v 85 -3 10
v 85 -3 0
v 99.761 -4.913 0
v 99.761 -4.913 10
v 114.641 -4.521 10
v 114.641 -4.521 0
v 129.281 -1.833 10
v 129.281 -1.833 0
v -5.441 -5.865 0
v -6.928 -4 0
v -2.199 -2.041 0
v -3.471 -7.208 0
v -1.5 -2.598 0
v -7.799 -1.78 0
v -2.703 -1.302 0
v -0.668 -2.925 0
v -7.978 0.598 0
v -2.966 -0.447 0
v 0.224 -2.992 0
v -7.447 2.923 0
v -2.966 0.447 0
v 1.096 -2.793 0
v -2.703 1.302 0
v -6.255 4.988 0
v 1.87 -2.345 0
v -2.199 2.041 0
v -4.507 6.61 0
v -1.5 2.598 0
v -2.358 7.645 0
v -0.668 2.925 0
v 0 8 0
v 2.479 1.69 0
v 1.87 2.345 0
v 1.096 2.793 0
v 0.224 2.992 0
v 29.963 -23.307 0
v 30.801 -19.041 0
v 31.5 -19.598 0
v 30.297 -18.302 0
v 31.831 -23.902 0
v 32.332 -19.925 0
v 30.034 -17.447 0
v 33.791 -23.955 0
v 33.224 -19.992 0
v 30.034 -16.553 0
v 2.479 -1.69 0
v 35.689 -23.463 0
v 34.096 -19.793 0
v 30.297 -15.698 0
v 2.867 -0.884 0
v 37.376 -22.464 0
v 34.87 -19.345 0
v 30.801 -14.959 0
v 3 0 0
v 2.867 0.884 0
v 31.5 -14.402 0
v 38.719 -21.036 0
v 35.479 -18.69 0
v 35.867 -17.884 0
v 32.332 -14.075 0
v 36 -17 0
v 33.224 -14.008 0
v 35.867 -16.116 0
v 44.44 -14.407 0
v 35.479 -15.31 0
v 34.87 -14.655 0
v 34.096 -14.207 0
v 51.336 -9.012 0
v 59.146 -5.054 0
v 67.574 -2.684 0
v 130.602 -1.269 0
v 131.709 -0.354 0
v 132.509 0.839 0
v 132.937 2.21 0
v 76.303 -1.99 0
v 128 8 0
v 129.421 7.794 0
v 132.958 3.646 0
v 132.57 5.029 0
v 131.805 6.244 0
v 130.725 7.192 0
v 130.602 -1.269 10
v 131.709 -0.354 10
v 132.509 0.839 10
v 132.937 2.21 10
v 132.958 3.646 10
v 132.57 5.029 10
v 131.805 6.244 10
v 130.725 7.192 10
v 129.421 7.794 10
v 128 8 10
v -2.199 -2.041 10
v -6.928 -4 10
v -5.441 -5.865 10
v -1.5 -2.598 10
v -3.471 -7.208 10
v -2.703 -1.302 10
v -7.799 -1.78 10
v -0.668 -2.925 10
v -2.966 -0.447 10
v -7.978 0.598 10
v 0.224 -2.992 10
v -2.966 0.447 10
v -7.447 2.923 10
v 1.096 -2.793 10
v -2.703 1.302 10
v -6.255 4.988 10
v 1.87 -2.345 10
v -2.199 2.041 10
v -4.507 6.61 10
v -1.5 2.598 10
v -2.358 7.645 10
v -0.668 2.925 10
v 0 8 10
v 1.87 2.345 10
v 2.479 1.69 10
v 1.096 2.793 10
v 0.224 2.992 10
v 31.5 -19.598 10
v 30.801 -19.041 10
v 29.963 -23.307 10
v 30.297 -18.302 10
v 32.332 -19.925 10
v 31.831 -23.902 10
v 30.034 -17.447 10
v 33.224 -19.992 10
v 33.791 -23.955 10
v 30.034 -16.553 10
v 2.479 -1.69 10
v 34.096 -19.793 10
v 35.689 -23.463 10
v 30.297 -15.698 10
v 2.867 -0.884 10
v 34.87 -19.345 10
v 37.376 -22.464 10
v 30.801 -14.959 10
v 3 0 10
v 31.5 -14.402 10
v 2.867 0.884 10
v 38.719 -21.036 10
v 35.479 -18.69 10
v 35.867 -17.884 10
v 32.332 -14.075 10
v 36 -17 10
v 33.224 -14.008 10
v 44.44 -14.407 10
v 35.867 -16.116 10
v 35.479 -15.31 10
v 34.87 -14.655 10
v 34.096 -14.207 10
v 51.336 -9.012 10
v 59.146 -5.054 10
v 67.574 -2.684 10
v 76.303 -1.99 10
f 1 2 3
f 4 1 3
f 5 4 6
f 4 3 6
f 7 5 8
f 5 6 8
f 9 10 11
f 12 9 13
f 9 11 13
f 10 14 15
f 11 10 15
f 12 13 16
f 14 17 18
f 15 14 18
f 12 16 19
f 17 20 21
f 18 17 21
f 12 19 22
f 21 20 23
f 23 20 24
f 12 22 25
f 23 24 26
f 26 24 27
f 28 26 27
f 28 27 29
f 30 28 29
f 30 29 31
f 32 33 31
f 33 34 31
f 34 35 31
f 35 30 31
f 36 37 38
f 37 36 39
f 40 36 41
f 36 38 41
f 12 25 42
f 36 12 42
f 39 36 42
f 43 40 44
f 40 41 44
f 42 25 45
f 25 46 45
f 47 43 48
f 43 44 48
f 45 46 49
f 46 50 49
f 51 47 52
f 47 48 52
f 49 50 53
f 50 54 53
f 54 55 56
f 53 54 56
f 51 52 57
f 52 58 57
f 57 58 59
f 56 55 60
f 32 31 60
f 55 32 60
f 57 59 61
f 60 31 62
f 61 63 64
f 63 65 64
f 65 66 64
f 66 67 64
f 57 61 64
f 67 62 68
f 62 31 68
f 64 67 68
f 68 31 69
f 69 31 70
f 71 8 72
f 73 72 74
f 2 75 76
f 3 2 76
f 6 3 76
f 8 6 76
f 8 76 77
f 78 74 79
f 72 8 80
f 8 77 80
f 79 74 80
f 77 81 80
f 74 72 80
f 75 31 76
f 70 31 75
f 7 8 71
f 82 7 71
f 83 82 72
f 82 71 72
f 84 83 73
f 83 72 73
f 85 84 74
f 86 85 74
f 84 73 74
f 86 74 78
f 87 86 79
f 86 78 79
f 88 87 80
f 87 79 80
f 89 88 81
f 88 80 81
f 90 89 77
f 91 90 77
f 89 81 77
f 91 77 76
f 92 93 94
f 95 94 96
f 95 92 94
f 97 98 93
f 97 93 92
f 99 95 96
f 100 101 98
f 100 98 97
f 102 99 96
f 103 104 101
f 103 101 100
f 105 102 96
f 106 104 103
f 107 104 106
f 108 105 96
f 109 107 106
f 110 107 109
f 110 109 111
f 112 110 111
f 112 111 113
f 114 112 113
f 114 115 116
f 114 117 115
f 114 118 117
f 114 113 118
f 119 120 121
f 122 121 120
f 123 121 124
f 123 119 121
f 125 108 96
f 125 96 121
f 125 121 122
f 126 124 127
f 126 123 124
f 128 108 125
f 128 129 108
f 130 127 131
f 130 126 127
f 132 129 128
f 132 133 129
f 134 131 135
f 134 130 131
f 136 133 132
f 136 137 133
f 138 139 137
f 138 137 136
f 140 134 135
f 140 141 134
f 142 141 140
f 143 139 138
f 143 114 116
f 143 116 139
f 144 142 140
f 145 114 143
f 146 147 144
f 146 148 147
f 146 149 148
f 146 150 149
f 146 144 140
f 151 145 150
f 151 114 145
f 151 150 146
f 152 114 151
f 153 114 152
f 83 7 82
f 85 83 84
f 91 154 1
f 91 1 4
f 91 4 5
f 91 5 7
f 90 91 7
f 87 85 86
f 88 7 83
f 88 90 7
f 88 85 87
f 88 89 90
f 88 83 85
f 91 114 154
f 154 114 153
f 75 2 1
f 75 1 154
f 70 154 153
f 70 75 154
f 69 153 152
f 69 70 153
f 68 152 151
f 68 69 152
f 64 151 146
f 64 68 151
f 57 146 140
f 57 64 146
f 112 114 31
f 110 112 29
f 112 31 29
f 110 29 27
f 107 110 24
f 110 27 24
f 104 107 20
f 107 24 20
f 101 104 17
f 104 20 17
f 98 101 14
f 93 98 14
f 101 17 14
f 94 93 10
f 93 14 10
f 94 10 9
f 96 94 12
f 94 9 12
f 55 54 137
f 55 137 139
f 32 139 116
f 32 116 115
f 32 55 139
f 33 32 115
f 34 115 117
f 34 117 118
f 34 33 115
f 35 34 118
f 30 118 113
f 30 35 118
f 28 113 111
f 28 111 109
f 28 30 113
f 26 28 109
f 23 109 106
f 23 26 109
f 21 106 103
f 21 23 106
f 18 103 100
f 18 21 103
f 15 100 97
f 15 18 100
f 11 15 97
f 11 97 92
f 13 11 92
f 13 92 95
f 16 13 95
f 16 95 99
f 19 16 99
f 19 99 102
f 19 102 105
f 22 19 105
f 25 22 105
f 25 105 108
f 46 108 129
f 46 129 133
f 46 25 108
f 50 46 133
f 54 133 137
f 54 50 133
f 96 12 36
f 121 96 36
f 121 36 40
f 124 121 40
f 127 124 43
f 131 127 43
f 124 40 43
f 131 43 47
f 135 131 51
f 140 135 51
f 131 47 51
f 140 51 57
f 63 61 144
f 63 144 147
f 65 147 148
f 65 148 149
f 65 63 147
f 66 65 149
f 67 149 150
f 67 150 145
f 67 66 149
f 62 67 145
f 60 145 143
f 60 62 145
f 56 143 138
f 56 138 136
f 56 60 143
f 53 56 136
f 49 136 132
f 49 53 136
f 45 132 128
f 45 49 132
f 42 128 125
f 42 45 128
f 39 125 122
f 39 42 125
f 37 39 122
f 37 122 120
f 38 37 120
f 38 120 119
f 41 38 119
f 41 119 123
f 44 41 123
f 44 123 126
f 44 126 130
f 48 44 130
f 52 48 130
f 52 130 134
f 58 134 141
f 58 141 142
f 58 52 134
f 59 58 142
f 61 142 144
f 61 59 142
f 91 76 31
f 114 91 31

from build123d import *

# Parameters (mm, degrees)
SKETCH_R  = 3
PAD_DEPTH = 10


with BuildPart() as part:
    # Sketch → Pad (new body)
    with BuildSketch(Plane.XY):
        with BuildLine():
            Line((128, 8), (0, 8))
            ThreePointArc((0, 8), (-7.799464, 1.77999), (-3.470741, -7.207909))
            Line((-3.470741, -7.207909), (29.963102, -23.306921))
            ThreePointArc((29.963102, -23.306921), (34.757227, -23.775851), (38.719233, -21.036134))
            ThreePointArc((85, -3), (59.145702, -5.054156), (38.719233, -21.036134))
            ThreePointArc((85, -3), (107.208893, -5.005497), (129.281329, -1.833032))
            ThreePointArc((129.281329, -1.833032), (132.958082, 3.646081), (128, 8))
        make_face()
        with Locations((33, -17)):
            Circle(SKETCH_R, mode=Mode.SUBTRACT)
        Circle(SKETCH_R, mode=Mode.SUBTRACT)
    extrude(amount=PAD_DEPTH)


solid = part.part
